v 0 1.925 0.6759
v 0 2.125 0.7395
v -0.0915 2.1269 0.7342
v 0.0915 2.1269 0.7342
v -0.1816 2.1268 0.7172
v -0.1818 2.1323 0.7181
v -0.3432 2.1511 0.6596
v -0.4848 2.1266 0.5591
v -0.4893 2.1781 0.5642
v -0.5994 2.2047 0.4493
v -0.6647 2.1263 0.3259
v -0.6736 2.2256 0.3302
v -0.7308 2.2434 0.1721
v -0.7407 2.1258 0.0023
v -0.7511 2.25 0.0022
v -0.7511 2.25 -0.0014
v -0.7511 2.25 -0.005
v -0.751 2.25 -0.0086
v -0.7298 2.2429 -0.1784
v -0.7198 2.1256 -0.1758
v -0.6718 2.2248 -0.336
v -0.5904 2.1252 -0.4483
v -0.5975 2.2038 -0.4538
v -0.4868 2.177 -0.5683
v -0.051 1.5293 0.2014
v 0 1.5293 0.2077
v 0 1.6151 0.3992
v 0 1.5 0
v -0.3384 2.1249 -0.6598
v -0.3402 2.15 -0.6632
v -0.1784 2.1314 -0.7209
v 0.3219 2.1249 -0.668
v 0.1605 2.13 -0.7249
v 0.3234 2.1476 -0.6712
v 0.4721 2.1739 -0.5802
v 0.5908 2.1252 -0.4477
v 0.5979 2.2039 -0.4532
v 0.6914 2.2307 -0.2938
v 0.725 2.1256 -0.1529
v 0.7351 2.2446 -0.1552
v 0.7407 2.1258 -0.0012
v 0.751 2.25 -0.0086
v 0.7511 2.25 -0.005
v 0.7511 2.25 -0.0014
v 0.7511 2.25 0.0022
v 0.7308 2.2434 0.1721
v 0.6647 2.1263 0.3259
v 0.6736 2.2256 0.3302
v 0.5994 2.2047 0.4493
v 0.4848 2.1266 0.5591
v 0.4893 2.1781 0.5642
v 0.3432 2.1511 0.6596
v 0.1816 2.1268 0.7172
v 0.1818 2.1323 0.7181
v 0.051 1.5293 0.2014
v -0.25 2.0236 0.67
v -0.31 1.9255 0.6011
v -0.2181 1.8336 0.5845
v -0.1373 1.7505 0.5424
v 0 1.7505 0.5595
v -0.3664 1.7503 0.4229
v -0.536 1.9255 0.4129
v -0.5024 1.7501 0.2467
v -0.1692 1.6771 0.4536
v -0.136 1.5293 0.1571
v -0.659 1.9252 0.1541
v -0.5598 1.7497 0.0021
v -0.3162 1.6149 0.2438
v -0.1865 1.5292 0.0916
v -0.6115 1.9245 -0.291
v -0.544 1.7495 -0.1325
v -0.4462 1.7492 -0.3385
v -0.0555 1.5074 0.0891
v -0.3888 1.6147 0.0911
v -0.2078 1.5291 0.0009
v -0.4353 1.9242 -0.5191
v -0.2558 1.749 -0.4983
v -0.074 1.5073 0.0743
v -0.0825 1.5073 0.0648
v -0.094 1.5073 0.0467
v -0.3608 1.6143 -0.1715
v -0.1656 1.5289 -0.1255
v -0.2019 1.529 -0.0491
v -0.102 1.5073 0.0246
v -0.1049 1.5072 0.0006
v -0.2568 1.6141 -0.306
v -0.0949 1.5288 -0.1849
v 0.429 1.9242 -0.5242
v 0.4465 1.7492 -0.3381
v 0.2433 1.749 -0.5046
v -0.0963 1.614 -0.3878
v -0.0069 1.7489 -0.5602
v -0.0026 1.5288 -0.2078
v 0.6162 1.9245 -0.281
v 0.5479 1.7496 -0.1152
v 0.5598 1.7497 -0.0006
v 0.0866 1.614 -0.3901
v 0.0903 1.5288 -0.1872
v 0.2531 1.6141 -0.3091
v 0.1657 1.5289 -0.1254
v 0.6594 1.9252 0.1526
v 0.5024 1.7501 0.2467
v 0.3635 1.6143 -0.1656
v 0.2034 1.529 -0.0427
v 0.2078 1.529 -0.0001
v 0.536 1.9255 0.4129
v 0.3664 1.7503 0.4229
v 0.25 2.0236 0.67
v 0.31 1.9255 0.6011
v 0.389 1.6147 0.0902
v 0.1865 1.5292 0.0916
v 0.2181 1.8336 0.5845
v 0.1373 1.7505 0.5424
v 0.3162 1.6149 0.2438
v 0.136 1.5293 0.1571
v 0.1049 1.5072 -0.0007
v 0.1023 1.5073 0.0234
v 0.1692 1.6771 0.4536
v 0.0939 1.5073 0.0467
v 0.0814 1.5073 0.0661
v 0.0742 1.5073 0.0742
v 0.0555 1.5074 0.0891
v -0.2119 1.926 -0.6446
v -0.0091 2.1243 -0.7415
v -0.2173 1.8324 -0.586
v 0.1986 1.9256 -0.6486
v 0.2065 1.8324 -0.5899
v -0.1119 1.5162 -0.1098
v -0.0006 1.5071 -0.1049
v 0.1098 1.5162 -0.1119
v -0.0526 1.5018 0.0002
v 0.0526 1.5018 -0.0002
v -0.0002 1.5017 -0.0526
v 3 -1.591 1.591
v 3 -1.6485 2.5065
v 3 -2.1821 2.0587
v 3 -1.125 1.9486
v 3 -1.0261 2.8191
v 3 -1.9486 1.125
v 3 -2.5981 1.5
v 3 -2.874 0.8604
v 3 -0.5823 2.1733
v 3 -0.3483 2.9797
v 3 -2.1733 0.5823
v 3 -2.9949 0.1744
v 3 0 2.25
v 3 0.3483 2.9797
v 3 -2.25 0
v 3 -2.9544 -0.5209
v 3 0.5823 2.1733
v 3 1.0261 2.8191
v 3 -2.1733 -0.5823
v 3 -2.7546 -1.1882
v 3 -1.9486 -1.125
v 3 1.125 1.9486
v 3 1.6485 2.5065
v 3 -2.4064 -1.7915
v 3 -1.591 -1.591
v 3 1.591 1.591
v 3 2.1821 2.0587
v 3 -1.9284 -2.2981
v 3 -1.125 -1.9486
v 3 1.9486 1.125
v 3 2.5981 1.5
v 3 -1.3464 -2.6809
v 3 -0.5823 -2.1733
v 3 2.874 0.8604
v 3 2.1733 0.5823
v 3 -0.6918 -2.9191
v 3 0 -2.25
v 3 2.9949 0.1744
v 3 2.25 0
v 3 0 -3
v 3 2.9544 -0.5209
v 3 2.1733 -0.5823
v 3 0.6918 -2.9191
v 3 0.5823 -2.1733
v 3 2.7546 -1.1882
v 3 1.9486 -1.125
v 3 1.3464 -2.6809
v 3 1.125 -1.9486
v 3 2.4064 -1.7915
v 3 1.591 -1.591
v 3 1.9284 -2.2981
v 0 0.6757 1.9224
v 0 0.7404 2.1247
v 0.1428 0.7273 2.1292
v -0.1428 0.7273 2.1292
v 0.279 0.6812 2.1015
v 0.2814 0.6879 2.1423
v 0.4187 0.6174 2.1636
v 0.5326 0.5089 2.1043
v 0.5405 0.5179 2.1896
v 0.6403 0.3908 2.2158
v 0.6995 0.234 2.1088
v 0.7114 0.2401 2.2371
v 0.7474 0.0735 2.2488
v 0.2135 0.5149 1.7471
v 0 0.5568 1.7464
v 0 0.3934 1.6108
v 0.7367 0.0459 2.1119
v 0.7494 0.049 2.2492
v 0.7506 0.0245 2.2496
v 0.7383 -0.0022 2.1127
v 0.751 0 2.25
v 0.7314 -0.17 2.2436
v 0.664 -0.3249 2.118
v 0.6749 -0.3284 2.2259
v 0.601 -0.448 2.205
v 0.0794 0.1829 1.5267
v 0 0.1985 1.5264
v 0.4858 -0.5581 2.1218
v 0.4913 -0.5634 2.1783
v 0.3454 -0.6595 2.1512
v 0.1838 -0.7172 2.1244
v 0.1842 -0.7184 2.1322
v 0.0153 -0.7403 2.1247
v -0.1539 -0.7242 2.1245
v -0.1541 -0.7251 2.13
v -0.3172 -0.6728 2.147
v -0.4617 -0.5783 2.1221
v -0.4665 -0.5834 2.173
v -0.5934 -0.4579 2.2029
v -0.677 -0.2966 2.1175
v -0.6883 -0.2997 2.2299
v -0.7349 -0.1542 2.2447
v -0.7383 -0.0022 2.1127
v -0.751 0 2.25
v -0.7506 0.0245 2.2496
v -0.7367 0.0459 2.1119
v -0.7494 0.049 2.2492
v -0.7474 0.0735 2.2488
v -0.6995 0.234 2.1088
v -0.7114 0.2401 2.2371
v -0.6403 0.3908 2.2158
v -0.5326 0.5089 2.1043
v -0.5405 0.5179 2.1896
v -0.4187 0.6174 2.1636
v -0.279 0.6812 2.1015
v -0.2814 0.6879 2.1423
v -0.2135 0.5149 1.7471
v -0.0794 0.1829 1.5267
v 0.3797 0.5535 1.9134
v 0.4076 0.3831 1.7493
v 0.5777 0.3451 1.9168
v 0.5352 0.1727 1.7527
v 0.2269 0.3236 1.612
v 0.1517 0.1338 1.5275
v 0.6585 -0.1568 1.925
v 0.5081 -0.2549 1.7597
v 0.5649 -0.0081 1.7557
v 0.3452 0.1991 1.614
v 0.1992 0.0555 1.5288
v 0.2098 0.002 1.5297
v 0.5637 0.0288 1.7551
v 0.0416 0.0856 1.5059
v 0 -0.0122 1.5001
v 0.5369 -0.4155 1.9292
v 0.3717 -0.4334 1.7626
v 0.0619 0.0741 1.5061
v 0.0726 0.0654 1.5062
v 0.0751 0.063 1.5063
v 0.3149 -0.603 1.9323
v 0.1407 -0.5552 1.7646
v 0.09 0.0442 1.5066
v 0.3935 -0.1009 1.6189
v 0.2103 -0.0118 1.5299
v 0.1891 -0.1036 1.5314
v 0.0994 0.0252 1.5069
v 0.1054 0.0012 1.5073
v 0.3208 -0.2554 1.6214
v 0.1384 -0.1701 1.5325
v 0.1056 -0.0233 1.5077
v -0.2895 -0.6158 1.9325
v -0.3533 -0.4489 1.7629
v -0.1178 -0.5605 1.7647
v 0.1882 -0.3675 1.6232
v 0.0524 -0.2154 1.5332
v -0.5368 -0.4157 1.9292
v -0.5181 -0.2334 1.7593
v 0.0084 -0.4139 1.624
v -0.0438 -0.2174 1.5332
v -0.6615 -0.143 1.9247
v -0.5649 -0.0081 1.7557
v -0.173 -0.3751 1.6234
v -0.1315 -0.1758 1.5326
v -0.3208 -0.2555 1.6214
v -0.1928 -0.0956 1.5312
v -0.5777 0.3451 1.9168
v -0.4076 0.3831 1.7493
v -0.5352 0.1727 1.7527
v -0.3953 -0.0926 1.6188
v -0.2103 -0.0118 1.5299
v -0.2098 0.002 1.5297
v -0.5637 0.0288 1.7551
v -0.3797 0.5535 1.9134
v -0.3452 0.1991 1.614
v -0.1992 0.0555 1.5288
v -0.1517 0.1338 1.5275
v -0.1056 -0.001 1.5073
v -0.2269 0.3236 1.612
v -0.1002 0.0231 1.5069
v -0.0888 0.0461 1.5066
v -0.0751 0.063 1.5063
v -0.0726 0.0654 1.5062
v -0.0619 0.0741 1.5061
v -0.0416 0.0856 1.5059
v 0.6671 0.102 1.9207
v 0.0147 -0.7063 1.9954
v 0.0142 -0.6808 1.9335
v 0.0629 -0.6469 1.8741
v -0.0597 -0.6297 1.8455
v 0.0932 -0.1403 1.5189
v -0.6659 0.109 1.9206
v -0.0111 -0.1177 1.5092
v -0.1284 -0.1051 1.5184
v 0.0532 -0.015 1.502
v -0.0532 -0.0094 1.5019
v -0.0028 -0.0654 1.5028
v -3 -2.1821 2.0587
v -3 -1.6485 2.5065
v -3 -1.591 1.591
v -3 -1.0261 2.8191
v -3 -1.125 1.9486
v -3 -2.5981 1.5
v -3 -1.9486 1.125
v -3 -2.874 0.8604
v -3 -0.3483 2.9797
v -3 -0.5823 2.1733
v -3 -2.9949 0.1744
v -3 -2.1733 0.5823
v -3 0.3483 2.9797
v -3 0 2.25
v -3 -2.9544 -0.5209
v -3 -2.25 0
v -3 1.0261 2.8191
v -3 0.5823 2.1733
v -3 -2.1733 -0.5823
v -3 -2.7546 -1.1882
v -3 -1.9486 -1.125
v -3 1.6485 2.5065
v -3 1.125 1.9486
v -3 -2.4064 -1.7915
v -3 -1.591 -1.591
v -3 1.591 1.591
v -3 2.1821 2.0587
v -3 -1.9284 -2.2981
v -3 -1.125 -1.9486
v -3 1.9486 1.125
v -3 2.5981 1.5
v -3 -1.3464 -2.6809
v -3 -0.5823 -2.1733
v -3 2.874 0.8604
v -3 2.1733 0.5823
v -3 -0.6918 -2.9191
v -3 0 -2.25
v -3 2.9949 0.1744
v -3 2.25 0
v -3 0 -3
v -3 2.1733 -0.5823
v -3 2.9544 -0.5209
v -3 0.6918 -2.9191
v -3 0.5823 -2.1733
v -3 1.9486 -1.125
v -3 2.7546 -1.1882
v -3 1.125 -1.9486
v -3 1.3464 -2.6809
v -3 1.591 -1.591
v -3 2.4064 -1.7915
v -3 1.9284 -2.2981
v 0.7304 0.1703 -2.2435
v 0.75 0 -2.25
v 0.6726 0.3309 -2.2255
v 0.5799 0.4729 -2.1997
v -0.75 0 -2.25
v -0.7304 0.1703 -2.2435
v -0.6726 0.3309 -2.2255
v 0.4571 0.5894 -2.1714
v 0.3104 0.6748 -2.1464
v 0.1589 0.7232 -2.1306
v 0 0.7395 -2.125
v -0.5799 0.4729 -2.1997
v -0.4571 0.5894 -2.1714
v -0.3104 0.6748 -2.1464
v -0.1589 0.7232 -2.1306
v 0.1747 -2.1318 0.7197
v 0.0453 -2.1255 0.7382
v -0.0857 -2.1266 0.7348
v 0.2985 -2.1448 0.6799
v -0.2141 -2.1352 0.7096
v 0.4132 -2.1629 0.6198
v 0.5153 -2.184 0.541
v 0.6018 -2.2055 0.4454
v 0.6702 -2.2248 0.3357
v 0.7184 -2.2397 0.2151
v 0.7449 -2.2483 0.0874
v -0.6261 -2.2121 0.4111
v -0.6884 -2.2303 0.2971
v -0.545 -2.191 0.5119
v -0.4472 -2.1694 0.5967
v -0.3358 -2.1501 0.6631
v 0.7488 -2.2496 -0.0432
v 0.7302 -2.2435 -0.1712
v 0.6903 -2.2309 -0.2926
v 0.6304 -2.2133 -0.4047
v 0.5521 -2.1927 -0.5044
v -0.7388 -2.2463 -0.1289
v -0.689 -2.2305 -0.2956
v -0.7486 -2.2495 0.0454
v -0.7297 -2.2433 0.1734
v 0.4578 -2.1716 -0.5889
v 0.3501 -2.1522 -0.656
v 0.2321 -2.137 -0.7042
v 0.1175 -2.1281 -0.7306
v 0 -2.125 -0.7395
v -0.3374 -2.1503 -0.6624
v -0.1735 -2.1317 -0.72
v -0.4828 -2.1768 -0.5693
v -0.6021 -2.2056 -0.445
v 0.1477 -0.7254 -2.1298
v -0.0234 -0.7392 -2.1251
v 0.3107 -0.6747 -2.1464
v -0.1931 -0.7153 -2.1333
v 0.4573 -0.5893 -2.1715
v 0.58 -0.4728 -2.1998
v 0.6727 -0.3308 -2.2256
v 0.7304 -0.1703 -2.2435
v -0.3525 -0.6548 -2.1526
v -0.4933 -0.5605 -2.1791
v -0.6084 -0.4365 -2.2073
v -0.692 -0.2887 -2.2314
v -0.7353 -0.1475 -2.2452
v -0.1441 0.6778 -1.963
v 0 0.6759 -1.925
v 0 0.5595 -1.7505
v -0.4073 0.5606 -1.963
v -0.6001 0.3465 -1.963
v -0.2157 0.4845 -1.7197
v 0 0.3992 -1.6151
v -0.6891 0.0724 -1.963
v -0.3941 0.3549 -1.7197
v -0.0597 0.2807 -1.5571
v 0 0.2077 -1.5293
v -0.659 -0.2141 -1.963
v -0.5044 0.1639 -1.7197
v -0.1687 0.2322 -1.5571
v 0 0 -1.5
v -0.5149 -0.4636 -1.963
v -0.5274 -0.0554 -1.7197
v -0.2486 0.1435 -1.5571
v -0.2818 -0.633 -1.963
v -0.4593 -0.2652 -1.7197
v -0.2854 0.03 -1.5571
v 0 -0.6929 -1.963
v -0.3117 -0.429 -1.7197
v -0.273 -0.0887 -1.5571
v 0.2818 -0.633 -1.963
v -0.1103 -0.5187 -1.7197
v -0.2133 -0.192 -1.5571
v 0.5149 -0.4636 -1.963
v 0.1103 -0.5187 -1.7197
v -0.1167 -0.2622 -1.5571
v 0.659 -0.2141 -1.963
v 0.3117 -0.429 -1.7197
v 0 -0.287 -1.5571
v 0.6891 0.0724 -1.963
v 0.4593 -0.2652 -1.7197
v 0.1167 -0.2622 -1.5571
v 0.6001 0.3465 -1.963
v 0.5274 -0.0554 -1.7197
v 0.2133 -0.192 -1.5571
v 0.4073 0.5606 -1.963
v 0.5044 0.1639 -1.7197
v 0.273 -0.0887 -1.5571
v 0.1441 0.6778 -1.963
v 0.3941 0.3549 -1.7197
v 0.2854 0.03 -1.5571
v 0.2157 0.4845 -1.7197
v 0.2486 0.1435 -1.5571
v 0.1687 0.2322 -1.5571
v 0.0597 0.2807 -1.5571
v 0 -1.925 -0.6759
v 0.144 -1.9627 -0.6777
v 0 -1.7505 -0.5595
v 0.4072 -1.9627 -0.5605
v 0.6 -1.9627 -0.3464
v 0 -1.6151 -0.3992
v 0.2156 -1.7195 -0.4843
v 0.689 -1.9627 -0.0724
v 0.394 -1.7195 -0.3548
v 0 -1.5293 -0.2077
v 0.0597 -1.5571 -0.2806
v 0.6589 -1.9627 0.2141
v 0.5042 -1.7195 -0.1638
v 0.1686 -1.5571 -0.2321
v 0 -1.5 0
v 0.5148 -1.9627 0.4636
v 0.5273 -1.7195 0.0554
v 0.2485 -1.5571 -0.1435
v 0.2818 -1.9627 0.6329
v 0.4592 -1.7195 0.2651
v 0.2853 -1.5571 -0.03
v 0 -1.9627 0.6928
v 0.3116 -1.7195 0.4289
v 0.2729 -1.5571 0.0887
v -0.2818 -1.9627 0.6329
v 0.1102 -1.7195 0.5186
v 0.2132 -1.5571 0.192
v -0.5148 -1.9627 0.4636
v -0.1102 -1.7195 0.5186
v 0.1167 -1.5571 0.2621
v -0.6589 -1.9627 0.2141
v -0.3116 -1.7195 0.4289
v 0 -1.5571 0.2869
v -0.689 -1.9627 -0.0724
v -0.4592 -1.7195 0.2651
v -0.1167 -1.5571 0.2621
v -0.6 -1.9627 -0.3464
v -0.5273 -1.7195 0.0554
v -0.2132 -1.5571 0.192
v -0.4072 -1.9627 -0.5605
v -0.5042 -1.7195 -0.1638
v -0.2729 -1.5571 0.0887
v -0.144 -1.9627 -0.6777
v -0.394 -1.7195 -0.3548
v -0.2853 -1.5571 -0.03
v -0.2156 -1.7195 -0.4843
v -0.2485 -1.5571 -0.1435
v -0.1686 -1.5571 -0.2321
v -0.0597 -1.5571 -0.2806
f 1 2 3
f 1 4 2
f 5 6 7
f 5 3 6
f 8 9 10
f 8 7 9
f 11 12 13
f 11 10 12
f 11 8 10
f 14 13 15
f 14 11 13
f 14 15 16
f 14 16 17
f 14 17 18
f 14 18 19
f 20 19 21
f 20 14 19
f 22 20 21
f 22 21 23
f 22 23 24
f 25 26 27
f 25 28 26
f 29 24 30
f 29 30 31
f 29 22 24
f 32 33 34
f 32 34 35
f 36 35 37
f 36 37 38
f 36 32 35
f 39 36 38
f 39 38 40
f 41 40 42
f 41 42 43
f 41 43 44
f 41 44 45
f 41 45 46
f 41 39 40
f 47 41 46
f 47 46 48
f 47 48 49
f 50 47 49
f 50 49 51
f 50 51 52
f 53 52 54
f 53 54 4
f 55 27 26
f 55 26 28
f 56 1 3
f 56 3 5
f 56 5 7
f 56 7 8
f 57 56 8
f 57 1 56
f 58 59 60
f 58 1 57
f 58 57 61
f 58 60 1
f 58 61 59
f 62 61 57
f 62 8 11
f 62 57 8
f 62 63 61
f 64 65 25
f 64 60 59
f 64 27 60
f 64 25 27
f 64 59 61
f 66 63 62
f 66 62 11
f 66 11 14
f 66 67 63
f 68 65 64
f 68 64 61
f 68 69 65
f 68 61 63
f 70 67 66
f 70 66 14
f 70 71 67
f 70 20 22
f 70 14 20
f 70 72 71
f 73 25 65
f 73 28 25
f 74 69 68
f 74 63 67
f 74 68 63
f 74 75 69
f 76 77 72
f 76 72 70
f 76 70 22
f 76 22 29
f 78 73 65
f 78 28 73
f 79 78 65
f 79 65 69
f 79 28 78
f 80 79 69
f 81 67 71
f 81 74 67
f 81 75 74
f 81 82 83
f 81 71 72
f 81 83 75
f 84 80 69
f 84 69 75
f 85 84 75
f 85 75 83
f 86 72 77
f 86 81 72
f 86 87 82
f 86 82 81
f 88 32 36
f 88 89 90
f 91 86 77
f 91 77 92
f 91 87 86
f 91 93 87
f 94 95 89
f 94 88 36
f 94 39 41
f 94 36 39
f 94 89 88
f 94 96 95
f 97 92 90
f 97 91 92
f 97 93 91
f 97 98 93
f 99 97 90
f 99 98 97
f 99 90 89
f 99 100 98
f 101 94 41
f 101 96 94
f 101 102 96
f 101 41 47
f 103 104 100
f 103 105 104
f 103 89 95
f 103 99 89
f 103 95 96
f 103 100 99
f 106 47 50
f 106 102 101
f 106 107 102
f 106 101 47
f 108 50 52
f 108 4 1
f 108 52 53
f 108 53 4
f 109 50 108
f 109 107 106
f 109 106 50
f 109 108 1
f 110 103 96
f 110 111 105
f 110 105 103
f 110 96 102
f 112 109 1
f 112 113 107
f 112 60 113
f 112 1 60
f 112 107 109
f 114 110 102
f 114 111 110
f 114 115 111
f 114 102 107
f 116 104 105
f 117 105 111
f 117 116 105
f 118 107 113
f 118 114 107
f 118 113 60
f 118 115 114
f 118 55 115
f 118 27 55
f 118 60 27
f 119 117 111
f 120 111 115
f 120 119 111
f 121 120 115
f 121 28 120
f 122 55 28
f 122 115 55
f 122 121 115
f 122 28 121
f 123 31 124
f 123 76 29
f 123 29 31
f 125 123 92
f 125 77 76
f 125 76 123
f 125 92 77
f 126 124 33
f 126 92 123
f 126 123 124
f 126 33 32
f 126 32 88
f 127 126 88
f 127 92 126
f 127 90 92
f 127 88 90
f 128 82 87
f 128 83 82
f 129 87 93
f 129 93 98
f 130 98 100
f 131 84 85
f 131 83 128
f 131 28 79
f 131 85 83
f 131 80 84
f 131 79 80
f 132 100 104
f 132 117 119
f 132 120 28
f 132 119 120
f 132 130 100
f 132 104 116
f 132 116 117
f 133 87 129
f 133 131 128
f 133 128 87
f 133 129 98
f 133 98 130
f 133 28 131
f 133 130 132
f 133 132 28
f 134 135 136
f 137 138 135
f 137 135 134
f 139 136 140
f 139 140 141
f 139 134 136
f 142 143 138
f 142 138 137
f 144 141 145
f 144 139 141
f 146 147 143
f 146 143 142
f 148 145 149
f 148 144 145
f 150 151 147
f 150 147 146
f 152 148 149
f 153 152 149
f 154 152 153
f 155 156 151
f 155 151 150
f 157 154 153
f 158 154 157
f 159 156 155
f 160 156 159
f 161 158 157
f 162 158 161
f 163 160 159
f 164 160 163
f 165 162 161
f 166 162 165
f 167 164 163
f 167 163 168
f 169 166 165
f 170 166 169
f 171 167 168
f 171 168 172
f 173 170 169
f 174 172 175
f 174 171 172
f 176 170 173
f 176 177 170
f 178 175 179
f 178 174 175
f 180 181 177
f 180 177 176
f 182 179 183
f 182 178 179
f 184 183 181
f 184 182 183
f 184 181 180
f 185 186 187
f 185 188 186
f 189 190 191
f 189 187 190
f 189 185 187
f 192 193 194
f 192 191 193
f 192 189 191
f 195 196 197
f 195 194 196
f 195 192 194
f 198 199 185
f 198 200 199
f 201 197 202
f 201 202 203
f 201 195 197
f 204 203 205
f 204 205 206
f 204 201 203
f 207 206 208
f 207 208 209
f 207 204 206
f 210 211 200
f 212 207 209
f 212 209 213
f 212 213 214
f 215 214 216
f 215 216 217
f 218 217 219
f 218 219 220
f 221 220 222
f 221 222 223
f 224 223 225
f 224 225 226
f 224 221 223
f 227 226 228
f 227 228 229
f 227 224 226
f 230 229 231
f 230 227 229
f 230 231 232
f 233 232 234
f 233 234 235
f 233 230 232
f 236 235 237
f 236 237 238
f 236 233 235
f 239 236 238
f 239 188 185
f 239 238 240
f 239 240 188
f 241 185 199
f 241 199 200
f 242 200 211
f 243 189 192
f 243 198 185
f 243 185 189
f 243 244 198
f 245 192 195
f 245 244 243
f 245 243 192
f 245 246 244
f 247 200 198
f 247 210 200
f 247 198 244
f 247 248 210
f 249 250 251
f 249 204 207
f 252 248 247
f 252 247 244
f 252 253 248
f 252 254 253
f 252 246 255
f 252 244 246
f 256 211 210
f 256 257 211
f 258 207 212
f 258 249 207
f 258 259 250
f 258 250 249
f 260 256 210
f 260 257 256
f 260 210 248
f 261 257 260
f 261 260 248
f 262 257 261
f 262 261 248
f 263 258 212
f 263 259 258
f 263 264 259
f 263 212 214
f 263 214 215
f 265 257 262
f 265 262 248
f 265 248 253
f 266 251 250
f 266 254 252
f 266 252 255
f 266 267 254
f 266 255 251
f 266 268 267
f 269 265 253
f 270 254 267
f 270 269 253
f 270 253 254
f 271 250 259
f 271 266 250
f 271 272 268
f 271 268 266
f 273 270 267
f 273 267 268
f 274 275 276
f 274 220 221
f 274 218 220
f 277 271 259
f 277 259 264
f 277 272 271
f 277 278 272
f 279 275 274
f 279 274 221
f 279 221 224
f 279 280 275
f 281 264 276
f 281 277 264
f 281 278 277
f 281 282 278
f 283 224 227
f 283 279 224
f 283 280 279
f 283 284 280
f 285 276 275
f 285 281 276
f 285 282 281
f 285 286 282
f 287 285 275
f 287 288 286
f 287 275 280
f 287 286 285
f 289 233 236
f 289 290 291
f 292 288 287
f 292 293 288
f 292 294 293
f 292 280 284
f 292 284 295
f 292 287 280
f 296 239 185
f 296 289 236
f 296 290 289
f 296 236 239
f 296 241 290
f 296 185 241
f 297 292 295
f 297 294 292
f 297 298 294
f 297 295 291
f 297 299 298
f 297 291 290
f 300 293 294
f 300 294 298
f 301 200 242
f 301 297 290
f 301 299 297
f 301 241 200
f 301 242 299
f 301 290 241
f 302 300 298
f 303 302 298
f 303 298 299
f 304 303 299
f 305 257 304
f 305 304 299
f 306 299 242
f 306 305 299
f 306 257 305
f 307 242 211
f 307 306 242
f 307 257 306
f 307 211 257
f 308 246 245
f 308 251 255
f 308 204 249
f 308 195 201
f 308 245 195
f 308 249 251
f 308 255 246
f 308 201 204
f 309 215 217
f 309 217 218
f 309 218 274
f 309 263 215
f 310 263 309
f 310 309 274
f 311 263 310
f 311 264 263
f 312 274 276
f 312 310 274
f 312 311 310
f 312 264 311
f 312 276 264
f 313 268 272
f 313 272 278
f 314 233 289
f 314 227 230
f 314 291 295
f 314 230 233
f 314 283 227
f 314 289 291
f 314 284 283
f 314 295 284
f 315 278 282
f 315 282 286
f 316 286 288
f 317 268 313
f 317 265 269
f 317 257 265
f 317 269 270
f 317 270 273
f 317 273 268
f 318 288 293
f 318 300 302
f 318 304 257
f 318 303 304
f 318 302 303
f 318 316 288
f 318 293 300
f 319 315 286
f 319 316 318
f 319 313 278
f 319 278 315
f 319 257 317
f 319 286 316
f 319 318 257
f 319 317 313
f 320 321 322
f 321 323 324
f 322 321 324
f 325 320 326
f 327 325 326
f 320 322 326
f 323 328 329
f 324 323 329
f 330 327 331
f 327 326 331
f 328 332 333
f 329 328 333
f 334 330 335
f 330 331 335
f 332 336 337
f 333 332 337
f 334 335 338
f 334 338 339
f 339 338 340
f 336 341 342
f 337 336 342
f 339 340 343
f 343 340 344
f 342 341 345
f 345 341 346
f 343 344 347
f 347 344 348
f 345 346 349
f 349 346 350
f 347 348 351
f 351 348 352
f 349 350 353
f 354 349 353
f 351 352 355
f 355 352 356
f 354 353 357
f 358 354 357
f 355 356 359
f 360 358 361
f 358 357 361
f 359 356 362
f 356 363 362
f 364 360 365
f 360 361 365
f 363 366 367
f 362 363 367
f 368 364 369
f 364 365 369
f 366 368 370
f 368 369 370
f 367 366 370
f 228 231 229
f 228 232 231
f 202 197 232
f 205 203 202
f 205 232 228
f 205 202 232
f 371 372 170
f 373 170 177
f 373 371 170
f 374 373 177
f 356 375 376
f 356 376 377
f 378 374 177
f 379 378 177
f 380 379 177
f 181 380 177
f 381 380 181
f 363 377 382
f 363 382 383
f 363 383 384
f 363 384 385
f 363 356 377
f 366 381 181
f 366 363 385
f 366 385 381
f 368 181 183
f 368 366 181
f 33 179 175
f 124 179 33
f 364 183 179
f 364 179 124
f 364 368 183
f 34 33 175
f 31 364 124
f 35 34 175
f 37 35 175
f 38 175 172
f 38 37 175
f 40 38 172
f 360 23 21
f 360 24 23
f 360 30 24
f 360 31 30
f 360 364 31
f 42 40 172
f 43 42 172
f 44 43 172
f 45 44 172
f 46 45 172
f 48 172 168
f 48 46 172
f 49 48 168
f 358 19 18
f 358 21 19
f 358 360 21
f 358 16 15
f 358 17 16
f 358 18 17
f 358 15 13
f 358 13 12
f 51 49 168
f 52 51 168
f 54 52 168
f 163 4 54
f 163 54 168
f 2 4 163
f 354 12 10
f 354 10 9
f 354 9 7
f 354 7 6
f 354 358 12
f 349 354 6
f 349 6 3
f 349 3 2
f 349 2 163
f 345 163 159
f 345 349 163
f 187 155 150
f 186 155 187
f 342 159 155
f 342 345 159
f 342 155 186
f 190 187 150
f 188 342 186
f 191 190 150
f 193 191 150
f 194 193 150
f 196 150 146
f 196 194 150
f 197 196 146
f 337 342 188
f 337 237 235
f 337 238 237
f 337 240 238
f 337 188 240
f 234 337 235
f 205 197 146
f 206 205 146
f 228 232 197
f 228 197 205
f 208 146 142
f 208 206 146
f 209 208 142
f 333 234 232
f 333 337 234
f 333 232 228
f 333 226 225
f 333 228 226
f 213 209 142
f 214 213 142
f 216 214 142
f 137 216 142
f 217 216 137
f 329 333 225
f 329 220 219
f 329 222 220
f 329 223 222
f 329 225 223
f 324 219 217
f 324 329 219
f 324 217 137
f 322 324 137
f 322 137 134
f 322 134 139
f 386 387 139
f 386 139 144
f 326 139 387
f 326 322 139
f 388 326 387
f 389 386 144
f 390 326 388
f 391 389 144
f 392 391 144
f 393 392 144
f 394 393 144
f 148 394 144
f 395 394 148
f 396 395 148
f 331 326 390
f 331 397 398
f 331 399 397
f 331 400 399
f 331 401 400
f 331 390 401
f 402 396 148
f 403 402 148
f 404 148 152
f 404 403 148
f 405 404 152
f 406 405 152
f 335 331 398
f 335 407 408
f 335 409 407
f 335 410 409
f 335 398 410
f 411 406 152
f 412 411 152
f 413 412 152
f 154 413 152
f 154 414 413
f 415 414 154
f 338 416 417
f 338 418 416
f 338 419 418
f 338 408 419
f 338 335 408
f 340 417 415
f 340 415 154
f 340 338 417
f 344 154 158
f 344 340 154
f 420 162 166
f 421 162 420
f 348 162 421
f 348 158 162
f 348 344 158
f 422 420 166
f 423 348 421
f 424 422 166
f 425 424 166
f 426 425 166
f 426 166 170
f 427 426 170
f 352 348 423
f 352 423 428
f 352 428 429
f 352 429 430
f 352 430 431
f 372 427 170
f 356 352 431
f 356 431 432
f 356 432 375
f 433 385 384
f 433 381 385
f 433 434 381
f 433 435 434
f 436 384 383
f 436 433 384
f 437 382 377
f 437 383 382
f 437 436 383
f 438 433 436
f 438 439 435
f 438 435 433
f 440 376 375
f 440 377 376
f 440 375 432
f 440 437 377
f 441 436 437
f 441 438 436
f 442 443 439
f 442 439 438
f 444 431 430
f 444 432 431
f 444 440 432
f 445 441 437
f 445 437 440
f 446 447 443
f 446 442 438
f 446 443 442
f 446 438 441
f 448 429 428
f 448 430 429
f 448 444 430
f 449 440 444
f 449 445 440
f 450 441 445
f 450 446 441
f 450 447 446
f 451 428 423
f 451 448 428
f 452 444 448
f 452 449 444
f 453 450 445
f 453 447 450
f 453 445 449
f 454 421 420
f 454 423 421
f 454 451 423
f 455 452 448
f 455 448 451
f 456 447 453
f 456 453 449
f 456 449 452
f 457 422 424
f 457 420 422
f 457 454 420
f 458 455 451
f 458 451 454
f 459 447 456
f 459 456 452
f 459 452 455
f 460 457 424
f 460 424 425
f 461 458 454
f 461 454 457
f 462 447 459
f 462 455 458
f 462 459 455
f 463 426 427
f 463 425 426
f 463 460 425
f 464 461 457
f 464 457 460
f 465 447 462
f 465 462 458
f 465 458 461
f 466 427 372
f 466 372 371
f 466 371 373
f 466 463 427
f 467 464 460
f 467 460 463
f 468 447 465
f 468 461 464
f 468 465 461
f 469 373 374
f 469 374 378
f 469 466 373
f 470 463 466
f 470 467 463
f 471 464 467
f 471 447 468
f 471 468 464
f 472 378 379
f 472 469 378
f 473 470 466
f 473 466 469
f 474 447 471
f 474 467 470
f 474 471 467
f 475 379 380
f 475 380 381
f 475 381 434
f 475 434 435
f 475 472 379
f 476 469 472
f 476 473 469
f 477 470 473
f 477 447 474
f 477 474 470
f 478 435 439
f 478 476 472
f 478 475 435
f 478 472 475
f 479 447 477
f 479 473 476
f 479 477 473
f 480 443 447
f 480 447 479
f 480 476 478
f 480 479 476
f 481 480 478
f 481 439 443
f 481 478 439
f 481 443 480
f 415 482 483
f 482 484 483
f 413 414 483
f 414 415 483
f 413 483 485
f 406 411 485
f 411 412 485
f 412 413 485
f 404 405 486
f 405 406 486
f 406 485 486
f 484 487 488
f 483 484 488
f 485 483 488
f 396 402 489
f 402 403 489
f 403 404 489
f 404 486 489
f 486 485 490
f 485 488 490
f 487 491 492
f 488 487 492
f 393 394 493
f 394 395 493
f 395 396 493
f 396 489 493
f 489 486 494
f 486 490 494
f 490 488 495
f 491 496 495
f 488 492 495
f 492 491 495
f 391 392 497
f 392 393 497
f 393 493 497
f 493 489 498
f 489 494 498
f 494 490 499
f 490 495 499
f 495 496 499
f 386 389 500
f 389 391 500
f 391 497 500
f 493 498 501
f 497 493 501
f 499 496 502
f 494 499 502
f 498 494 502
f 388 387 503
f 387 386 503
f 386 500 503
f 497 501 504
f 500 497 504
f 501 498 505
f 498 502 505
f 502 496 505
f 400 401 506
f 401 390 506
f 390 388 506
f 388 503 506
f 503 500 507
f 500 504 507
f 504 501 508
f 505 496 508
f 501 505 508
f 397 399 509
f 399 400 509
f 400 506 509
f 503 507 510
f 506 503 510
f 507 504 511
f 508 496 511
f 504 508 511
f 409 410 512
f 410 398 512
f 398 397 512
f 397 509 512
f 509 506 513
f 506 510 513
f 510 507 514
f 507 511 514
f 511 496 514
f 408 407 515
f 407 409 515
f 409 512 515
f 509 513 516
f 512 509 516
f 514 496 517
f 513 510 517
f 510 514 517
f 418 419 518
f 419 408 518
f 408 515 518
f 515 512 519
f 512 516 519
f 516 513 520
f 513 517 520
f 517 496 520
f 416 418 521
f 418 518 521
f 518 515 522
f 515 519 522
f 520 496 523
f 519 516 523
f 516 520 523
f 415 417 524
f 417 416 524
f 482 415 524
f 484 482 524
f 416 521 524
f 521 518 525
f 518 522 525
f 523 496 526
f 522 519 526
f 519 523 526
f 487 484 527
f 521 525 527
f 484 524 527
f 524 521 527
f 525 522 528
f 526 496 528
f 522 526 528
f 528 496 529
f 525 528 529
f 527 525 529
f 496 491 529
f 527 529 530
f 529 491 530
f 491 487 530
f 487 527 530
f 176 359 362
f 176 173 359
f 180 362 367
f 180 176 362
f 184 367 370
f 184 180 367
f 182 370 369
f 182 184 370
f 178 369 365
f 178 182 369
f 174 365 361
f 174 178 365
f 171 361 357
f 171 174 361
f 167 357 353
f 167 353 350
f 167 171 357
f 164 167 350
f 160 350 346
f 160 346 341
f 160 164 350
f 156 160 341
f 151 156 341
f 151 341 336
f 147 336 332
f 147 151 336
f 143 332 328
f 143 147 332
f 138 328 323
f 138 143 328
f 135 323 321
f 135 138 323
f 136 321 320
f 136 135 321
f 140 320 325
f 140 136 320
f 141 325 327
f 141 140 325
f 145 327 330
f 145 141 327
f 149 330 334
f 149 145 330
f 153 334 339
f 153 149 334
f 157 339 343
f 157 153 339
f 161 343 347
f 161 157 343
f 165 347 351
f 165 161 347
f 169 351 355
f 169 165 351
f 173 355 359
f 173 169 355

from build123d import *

# Parameters (mm, degrees)
SKETCH2_R           = 3
SKETCH2_R_2         = 2.25
BOSS_EXTRUDE1_DEPTH = 3


with BuildPart() as part:
    # Sketch2 → Boss-Extrude1 (new, symmetric)
    with BuildSketch(Plane(origin=(0, 0, 0), x_dir=(0, 0, -1), z_dir=(1, 0, 0))):
        Circle(SKETCH2_R)
        Circle(SKETCH2_R_2, mode=Mode.SUBTRACT)
    extrude(amount=BOSS_EXTRUDE1_DEPTH, both=True)

    # Sketch8 → Revolve18 (revolve)
    with BuildSketch(Plane(origin=(0, 0, 0), x_dir=(0, 0, -1), z_dir=(1, 0, 0))):
        with BuildLine():
            Line((-2.25, 0), (-2.237739596, 0.750859778))
            ThreePointArc((-2.237739596, 0.750859778), (-1.7107227, 0.52222122), (-1.500084905, -0.012244979))
            Line((-1.500084905, -0.012244979), (-2.25, 0))
        make_face()
    revolve(axis=Axis((0, 0, 2.25), (0, -0.016326311142728266, -0.999866716900043)))

    # Sketch10 → Revolve19 (revolve)
    with BuildSketch(Plane(origin=(0, 0, 0), x_dir=(0, 0, -1), z_dir=(1, 0, 0))):
        with BuildLine():
            Line((2.25, 0), (2.25, 0.75))
            ThreePointArc((2.25, 0.75), (1.719669914, 0.530330086), (1.5, 0))
            Line((1.5, 0), (2.25, 0))
        make_face()
    revolve(axis=Axis((0, 0, -2.25), (0, 0, 1)))


with BuildPart() as revolve20_tool:
    # Sketch11 → Revolve20 (revolve)
    with BuildSketch(Plane(origin=(0, 0, 0), x_dir=(0, 0, -1), z_dir=(1, 0, 0))):
        with BuildLine():
            Line((0.001073711, 2.249994313), (-0.749995081, 2.251069562))
            ThreePointArc((-0.749995081, 2.251069562), (-0.53070663, 1.720048449), (0, 1.5))
            Line((0, 1.5), (0.001073711, 2.249994313))
        make_face()
    revolve(axis=Axis((0, 2.249994313, -0.001073711), (0, -0.9999989752258402, 0.0014316239972306517)))


with BuildPart() as part_1:
    add(part.part)


with BuildPart() as part_2:
    # Revolve20: joined with revolve20_tool
    add(part_1.part.fuse(revolve20_tool.part, tol=0.00001))

    # Sketch13 → Revolve21 (revolve)
    with BuildSketch(Plane(origin=(0, 0, 0), x_dir=(0, 0, -1), z_dir=(1, 0, 0))):
        with BuildLine():
            Line((0, -1.5), (0, -2.25))
            Line((0, -2.25), (0.75, -2.25))
            ThreePointArc((0.75, -2.25), (0.530330086, -1.719669914), (0, -1.5))
        make_face()
    revolve(axis=Axis((0, -1.5, 0), (0, -1, 0)))


solid = part_2.part
